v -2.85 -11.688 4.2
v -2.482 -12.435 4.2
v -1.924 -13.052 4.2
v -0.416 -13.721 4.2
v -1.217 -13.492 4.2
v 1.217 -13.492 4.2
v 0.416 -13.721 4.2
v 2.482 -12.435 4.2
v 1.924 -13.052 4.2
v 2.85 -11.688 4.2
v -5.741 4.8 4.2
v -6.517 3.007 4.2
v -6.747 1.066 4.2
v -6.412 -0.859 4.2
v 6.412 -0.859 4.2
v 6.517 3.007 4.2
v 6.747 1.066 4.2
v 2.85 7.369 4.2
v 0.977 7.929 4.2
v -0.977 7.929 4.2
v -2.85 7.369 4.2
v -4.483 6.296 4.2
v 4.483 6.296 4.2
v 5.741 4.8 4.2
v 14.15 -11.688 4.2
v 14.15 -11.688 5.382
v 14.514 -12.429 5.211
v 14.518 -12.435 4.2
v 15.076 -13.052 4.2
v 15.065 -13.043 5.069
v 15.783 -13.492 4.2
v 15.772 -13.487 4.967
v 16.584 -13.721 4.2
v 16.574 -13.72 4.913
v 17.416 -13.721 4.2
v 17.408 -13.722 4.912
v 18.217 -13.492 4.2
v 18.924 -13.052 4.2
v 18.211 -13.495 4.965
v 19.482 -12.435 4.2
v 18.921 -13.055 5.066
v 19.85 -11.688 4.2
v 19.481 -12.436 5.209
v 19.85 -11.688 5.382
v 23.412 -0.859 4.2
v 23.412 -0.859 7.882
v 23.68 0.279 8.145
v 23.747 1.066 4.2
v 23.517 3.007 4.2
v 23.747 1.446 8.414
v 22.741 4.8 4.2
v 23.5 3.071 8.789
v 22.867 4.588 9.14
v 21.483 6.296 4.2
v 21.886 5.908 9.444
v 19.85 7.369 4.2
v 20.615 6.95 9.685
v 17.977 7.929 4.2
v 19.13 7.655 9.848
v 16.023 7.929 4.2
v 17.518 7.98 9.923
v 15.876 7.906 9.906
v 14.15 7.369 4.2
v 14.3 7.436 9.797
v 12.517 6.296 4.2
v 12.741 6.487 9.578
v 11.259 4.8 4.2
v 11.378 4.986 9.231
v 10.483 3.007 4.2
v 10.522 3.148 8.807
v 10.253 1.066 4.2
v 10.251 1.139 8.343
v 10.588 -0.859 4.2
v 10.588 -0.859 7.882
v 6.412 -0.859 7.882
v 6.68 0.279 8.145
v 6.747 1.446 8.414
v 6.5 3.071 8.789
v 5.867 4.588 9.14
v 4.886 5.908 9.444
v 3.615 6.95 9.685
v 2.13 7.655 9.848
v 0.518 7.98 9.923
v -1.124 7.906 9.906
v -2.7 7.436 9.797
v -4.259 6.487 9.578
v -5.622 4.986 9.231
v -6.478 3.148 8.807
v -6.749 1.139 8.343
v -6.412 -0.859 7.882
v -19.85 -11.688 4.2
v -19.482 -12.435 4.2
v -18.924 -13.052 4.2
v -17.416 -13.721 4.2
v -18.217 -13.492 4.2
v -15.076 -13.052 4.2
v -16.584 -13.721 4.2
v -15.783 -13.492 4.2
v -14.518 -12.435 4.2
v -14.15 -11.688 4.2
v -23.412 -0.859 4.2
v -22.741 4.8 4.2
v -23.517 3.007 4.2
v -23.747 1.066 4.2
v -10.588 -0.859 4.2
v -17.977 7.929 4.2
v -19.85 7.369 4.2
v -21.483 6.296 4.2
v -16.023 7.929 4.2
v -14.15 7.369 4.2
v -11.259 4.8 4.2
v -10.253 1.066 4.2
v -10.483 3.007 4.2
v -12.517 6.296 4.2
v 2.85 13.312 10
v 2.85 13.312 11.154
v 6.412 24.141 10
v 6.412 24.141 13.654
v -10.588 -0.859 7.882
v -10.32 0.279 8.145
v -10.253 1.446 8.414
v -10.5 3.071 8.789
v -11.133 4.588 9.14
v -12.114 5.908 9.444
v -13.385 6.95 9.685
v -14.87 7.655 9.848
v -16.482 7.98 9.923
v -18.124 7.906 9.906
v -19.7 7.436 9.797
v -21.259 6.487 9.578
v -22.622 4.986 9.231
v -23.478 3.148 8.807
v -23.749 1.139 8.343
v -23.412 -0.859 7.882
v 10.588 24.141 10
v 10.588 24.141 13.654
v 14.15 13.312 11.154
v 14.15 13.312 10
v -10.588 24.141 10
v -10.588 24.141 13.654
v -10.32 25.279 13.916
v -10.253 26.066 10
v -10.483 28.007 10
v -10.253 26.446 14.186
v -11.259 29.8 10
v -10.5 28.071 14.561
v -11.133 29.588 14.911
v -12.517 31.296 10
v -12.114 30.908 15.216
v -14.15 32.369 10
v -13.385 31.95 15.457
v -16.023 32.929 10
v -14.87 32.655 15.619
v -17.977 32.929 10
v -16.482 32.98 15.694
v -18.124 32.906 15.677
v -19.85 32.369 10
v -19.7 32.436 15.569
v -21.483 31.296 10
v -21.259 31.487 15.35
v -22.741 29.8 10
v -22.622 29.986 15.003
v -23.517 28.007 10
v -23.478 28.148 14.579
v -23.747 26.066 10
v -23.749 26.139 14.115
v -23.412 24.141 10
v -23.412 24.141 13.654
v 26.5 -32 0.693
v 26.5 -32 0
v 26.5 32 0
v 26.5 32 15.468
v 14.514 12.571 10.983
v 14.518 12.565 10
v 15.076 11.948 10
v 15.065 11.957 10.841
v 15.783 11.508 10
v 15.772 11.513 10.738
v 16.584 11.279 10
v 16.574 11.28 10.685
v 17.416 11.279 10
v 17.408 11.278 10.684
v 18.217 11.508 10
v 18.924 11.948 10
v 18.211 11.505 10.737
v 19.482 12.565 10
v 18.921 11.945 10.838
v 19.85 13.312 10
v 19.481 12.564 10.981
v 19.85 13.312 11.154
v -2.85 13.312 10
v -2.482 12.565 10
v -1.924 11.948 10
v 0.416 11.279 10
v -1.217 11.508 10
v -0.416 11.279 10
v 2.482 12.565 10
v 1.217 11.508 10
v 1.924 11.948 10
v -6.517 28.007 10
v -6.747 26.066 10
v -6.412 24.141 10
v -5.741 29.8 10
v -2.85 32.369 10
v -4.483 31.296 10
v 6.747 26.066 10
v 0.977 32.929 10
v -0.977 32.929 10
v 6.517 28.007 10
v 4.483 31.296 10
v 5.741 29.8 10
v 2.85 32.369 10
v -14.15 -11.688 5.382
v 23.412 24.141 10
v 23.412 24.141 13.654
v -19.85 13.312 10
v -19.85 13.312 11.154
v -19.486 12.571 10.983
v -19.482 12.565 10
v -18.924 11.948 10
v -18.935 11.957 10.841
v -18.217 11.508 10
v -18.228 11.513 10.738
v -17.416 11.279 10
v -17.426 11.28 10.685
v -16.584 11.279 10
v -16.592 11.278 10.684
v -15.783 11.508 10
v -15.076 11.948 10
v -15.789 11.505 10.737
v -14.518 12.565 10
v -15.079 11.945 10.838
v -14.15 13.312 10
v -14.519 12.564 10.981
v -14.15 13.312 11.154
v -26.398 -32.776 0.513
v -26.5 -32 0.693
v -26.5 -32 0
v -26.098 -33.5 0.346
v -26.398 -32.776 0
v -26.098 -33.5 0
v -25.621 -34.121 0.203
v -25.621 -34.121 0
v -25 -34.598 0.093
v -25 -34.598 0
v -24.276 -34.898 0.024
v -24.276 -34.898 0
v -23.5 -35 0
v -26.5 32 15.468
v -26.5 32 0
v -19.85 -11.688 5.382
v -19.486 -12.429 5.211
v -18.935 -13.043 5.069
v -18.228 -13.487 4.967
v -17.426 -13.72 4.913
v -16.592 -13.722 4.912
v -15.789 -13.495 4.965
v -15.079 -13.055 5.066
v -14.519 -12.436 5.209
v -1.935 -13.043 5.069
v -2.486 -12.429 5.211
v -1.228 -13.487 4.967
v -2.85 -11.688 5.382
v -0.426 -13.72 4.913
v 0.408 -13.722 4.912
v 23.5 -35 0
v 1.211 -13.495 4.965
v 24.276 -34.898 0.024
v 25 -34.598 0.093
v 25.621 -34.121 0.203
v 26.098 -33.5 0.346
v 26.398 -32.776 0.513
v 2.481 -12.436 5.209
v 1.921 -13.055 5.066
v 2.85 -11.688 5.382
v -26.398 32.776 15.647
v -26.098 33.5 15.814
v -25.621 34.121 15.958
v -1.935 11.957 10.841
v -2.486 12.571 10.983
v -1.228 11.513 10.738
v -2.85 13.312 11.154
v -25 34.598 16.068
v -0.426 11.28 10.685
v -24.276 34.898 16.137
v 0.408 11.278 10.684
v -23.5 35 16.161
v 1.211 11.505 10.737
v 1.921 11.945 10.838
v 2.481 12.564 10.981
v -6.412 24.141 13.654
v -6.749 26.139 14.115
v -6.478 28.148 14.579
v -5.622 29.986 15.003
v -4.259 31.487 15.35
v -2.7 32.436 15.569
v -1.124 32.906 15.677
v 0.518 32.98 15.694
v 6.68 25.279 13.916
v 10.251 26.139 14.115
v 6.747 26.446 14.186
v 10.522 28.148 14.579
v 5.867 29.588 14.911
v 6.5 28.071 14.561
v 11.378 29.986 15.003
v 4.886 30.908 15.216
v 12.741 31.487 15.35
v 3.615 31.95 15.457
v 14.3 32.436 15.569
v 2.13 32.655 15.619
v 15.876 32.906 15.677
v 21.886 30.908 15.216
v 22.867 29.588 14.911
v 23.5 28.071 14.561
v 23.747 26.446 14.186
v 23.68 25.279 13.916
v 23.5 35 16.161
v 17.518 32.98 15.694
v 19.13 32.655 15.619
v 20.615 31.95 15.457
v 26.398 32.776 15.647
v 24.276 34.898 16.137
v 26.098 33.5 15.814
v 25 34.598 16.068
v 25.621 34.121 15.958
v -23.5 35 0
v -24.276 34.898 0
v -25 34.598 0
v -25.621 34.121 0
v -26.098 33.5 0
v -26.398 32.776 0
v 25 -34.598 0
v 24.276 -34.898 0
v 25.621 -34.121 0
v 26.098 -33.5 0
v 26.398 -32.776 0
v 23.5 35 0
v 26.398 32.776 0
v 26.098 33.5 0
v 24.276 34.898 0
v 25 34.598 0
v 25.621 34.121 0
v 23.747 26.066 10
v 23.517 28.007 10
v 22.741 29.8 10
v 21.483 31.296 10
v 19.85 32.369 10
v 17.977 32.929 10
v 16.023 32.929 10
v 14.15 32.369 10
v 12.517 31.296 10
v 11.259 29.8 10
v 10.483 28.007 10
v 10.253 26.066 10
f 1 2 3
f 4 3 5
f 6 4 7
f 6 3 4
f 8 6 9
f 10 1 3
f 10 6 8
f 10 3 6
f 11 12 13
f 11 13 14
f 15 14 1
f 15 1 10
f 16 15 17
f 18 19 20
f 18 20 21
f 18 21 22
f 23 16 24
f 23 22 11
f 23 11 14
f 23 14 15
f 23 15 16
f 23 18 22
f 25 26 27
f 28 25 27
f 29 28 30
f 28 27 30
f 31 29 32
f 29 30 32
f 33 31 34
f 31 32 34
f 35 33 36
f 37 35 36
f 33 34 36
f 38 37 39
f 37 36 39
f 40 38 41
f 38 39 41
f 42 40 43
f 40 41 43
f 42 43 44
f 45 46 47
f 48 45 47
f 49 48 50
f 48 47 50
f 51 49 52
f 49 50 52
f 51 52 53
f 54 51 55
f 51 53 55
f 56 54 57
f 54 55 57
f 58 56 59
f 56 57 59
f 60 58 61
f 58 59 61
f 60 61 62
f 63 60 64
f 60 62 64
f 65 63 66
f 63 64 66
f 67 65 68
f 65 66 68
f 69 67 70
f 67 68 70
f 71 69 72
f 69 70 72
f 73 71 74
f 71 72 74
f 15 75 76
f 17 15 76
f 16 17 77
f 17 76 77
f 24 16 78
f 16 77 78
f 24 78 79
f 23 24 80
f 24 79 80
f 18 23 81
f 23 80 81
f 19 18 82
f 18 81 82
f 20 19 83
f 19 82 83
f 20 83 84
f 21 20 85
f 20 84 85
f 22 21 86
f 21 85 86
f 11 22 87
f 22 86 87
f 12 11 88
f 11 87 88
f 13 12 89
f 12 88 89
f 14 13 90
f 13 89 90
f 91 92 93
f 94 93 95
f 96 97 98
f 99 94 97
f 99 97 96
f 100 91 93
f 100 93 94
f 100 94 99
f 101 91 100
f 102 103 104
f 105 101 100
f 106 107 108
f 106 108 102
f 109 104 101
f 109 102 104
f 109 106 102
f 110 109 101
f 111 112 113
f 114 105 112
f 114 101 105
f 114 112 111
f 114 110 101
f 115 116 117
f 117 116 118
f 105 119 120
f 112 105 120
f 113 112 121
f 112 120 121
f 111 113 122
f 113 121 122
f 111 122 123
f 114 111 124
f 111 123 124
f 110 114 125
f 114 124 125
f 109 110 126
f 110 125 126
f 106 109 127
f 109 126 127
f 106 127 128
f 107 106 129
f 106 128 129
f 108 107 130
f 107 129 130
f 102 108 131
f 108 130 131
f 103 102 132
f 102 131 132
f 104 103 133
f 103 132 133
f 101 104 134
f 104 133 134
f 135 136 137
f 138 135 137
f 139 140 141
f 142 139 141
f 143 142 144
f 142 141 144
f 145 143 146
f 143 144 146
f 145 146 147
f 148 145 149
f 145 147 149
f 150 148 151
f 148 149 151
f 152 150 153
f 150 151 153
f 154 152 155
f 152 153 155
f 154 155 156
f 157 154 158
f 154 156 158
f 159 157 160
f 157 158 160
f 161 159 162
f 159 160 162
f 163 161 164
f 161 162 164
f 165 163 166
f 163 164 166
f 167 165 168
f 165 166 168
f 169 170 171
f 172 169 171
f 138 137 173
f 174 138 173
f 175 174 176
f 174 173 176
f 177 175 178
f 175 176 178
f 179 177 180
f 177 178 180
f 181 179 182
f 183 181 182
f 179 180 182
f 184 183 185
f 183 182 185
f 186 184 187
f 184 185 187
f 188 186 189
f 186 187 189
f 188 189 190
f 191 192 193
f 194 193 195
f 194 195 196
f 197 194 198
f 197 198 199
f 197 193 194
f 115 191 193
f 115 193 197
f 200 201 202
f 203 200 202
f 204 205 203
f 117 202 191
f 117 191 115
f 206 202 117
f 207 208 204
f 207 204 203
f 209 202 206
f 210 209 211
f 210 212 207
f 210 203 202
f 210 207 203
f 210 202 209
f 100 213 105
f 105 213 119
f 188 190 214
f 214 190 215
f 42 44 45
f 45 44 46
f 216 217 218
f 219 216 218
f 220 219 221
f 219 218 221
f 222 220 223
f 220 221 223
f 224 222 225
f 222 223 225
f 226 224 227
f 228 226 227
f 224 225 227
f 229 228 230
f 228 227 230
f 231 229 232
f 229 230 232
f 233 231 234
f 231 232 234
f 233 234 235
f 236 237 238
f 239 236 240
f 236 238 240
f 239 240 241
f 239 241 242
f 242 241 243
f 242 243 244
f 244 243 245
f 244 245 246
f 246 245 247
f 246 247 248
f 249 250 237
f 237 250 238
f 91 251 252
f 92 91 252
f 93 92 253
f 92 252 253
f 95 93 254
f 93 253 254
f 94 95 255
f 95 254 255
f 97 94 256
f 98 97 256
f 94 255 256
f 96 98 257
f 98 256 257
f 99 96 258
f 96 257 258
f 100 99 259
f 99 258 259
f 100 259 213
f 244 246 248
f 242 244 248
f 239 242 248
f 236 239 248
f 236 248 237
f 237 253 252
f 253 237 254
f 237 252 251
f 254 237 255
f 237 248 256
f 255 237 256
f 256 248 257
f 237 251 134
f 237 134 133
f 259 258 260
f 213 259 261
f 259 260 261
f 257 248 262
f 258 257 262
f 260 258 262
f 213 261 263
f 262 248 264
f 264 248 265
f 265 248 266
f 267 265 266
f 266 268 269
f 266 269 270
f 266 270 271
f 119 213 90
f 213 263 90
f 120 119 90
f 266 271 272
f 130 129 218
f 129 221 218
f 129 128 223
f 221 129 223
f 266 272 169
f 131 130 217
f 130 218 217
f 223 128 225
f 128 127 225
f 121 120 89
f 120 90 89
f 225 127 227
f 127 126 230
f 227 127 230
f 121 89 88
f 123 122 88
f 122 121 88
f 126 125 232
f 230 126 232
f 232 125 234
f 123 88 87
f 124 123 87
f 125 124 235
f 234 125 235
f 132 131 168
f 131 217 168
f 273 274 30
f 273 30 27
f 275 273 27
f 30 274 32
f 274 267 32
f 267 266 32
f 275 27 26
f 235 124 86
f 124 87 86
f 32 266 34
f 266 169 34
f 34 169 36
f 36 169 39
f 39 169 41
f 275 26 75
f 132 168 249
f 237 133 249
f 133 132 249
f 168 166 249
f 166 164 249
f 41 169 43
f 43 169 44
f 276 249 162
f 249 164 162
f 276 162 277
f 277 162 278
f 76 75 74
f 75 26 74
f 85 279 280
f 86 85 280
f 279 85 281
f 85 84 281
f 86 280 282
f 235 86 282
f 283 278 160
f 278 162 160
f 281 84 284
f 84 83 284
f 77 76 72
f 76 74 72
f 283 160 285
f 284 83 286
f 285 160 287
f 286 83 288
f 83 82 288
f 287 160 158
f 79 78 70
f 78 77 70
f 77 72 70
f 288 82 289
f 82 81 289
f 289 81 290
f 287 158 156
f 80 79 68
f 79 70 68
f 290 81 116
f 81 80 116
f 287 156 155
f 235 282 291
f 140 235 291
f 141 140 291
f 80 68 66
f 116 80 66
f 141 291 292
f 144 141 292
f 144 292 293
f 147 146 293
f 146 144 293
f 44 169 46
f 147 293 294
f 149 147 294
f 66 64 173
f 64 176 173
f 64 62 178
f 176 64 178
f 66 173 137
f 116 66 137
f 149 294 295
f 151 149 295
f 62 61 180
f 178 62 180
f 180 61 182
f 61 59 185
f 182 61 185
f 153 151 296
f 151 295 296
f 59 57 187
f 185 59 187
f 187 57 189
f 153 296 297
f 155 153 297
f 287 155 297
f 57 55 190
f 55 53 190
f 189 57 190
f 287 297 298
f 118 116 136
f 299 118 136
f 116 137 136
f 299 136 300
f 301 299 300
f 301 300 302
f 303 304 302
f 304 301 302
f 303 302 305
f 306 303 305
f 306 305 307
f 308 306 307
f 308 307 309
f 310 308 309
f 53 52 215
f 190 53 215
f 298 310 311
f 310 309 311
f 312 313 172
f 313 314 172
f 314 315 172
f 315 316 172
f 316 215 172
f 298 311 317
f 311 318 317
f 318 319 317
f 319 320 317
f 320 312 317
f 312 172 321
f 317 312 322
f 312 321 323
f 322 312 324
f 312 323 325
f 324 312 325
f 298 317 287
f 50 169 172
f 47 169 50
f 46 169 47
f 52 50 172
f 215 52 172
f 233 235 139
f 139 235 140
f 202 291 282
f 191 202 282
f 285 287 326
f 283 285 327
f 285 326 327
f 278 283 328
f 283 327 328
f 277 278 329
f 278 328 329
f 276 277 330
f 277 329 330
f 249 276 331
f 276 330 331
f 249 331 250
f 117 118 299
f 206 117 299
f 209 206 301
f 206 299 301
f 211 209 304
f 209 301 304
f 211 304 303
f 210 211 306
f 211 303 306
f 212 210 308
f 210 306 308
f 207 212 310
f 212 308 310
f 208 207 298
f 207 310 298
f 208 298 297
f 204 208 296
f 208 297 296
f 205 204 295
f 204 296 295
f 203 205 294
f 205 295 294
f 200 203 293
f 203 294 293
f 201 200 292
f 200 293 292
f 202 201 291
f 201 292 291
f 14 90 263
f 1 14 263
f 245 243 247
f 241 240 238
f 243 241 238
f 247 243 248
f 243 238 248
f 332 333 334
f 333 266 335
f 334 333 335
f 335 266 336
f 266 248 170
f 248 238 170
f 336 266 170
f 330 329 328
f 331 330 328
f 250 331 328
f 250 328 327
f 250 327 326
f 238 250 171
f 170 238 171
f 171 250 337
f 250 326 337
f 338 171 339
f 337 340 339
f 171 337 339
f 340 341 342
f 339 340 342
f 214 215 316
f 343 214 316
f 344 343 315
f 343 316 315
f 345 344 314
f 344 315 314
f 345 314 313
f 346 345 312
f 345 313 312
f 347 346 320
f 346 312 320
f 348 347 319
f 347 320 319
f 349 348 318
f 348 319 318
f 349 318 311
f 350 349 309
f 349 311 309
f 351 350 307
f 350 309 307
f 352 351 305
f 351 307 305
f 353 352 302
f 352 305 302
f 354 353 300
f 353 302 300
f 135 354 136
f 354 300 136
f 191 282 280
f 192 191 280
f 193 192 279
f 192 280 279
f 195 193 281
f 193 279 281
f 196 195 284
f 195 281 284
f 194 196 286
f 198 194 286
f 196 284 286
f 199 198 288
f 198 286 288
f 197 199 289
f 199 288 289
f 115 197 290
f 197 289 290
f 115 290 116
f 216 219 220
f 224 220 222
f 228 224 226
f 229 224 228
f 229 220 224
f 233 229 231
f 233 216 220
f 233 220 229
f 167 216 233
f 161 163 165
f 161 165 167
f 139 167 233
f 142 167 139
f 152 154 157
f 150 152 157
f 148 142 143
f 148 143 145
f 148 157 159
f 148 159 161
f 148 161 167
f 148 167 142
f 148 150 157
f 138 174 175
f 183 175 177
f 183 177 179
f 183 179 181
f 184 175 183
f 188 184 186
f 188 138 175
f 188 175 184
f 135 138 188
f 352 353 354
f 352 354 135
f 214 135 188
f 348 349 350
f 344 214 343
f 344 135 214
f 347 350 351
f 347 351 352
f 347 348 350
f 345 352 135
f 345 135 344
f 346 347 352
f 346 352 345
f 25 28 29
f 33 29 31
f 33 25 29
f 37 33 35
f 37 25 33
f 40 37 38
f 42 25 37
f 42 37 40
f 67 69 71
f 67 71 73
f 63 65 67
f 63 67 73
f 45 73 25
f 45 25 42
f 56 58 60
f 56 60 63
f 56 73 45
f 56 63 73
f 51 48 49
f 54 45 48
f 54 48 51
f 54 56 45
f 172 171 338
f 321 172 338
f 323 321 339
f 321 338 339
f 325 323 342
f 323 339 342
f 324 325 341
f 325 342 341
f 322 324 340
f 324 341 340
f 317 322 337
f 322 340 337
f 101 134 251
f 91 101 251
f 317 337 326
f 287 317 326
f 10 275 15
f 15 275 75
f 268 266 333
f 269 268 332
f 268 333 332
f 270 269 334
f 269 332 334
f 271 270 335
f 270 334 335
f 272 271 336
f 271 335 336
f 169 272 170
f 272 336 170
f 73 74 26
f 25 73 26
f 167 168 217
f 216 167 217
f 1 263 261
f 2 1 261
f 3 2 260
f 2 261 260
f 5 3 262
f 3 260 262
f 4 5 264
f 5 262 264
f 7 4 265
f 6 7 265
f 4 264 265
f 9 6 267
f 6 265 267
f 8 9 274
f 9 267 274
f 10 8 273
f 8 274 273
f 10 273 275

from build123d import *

# Parameters (mm, degrees)
F1_DEPTH = 25
F3_DEPTH = 53.001
F6_DEPTH = 15
F8_DEPTH = 20.8


with BuildPart() as f1:
    # F0 (on Top) → F1 (new body)
    with BuildSketch(Plane.XY):
        with BuildLine():
            Line((23.5, 35), (-23.5, 35))
            ThreePointArc((-23.5, 35), (-25.62132, 34.12132), (-26.5, 32))
            Line((-26.5, 32), (-26.5, -32))
            ThreePointArc((-26.5, -32), (-25.62132, -34.12132), (-23.5, -35))
            Line((-23.5, -35), (23.5, -35))
            ThreePointArc((23.5, -35), (25.62132, -34.12132), (26.5, -32))
            Line((26.5, -32), (26.5, 32))
            ThreePointArc((26.5, 32), (25.62132, 34.12132), (23.5, 35))
        make_face()
    extrude(amount=F1_DEPTH)

    # F2 (on face) → F3 (cut, through all)
    with BuildSketch(Plane.YZ.offset(26.5)):
        Polygon((-35, 25), (-35, 0), (35, 16.160773), (35, 25), align=None)
    extrude(amount=-F3_DEPTH, mode=Mode.SUBTRACT)

    # F5 (on offset) → F6 (cut)
    with BuildSketch(Plane.XY.offset(25)):
        with BuildLine():
            Line((2.849753, 13.3125), (6.411945, 24.140625))
            ThreePointArc((6.411945, 24.140625), (0, 33), (-6.411945, 24.140625))
            Line((-6.411945, 24.140625), (-2.849753, 13.3125))
            ThreePointArc((-2.849753, 13.3125), (0, 11.25), (2.849753, 13.3125))
        make_face()
        with BuildLine():
            Line((19.849753, 13.3125), (23.411945, 24.140625))
            ThreePointArc((23.411945, 24.140625), (17, 33), (10.588055, 24.140625))
            Line((10.588055, 24.140625), (14.150247, 13.3125))
            ThreePointArc((14.150247, 13.3125), (17, 11.25), (19.849753, 13.3125))
        make_face()
        with BuildLine():
            ThreePointArc((-19.849753, 13.3125), (-17, 11.25), (-14.150247, 13.3125))
            Line((-14.150247, 13.3125), (-10.588055, 24.140625))
            ThreePointArc((-10.588055, 24.140625), (-17, 33), (-23.411945, 24.140625))
            Line((-23.411945, 24.140625), (-19.849753, 13.3125))
        make_face()
    extrude(amount=-F6_DEPTH, mode=Mode.SUBTRACT)

    # F7 (on offset) → F8 (cut)
    with BuildSketch(Plane.XY.offset(25)):
        with BuildLine():
            Line((10.588055, -0.859375), (14.150247, -11.6875))
            ThreePointArc((14.150247, -11.6875), (17, -13.75), (19.849753, -11.6875))
            Line((19.849753, -11.6875), (23.411945, -0.859375))
            ThreePointArc((23.411945, -0.859375), (17, 8), (10.588055, -0.859375))
        make_face()
        with BuildLine():
            ThreePointArc((-2.849753, -11.6875), (0, -13.75), (2.849753, -11.6875))
            Line((2.849753, -11.6875), (6.411945, -0.859375))
            ThreePointArc((6.411945, -0.859375), (0, 8), (-6.411945, -0.859375))
            Line((-6.411945, -0.859375), (-2.849753, -11.6875))
        make_face()
        with BuildLine():
            ThreePointArc((-19.849753, -11.6875), (-17, -13.75), (-14.150247, -11.6875))
            Line((-14.150247, -11.6875), (-10.588055, -0.859375))
            ThreePointArc((-10.588055, -0.859375), (-17, 8), (-23.411945, -0.859375))
            Line((-23.411945, -0.859375), (-19.849753, -11.6875))
        make_face()
    extrude(amount=-F8_DEPTH, mode=Mode.SUBTRACT)


solid = f1.part
